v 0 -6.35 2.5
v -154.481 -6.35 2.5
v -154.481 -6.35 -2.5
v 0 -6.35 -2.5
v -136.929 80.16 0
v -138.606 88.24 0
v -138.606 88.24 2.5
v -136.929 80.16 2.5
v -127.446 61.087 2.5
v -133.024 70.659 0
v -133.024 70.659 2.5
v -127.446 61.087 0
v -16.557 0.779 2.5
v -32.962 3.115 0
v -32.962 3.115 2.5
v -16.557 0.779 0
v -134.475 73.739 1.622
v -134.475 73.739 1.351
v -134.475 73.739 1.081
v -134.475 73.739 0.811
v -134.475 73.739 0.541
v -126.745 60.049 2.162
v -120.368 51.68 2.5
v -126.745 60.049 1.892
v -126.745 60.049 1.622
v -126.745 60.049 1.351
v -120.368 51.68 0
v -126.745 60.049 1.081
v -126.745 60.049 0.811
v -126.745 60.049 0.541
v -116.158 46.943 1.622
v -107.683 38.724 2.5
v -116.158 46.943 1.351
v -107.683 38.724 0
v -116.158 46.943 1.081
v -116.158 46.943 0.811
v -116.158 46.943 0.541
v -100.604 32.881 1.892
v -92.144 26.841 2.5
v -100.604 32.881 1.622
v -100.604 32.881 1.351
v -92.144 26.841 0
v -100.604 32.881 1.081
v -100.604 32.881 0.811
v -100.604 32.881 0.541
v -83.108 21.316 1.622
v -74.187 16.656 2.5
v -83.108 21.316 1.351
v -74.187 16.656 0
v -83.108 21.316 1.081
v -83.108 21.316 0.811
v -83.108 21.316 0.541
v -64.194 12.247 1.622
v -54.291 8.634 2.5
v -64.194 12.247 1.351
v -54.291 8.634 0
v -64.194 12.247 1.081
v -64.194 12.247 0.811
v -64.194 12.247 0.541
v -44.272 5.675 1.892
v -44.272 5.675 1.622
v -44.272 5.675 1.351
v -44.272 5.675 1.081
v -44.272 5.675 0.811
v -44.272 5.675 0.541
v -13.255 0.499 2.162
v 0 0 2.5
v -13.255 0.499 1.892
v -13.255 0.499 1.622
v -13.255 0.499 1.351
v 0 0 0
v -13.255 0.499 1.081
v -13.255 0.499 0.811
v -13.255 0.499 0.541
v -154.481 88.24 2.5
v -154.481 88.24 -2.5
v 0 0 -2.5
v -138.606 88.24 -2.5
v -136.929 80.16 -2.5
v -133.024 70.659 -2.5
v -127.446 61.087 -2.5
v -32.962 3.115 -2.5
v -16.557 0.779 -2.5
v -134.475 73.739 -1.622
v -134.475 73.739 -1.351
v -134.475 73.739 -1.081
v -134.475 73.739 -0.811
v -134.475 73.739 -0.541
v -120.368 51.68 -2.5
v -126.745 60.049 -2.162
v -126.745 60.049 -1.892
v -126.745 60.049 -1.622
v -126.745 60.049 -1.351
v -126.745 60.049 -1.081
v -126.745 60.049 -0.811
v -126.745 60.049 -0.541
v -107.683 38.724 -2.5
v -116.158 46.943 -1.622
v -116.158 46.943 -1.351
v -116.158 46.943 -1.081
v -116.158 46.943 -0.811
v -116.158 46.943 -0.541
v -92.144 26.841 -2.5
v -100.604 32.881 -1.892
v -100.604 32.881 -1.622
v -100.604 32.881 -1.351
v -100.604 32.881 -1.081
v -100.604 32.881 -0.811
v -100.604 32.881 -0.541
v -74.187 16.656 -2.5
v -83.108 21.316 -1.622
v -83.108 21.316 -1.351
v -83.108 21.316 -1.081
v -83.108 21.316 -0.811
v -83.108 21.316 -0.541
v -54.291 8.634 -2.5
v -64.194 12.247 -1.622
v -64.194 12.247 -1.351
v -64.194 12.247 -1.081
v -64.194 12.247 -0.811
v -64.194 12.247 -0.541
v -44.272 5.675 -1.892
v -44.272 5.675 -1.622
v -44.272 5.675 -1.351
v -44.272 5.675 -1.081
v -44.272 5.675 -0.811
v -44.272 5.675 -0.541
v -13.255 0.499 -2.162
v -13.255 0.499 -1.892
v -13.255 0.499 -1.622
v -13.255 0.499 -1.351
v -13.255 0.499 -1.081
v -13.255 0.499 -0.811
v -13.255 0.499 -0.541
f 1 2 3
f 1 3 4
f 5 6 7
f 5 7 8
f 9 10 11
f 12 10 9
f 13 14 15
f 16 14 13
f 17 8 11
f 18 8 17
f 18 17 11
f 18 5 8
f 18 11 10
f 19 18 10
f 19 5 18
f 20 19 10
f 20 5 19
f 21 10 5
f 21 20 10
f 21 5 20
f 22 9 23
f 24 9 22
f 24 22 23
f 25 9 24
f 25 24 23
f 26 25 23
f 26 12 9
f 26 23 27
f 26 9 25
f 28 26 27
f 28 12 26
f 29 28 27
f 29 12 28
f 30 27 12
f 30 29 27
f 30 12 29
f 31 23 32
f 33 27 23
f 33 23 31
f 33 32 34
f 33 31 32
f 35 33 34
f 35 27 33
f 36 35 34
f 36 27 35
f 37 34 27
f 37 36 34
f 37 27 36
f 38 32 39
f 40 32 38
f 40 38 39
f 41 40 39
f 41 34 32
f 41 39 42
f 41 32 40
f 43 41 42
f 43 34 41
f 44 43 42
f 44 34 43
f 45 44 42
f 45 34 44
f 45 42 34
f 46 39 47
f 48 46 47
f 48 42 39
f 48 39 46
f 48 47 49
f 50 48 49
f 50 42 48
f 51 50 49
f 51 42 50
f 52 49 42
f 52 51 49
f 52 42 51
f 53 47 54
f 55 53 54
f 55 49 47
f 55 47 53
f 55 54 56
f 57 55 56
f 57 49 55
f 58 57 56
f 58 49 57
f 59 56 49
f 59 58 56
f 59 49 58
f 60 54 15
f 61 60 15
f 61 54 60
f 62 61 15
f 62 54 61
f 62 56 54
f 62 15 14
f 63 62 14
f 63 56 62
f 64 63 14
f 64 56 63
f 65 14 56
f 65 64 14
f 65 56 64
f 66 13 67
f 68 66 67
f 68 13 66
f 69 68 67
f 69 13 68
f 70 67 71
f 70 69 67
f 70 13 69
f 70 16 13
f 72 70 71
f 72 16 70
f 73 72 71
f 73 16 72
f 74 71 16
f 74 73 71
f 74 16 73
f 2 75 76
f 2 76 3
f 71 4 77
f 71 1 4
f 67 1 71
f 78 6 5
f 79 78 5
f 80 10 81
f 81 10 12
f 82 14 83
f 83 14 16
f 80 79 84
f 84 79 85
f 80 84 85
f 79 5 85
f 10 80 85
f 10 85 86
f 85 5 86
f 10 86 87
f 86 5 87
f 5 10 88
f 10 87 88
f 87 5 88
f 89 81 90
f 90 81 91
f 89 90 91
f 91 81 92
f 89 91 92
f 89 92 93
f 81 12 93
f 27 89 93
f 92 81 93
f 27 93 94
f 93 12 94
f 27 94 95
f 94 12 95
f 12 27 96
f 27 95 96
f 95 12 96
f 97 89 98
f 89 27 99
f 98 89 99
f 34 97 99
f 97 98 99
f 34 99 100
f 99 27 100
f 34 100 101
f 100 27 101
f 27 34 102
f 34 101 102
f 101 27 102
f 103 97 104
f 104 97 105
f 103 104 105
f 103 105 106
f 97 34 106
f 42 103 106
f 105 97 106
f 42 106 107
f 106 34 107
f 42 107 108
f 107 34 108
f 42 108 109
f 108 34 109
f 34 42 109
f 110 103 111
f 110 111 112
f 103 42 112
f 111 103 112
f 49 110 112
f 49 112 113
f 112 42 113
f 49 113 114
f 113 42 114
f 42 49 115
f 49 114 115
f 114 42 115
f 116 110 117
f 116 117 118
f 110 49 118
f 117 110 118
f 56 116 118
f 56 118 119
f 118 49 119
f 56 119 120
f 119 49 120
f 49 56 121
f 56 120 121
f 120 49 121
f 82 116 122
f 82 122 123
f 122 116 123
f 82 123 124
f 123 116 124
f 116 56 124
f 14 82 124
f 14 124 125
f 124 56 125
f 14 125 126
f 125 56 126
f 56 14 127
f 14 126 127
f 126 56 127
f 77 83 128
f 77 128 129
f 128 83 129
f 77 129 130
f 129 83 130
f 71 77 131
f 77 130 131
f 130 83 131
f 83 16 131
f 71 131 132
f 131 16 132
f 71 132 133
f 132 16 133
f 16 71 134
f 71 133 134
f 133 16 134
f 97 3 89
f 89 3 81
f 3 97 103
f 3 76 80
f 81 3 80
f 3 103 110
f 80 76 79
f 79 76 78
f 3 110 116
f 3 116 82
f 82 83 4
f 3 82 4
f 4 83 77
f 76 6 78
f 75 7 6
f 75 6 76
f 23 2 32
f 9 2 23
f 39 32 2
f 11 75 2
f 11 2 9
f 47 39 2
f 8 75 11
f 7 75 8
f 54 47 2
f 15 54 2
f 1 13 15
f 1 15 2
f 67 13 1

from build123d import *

# Parameters (mm, degrees)
BOSS_EXTRUDE1_DEPTH = 2.5


with BuildPart() as part:
    # Sketch1 → Boss-Extrude1 (new, symmetric)
    with BuildSketch(Plane.XY):
        with BuildLine():
            Line((-138.606439558, 88.2396), (-154.481439558, 88.2396))
            Line((-154.481439558, 88.2396), (-154.481439558, -6.35))
            Line((-154.481439558, -6.35), (0, -6.35))
            Line((0, -6.35), (0, 0))
            add(Edge.make_bspline(
                [(-138.606439558, 88.2396), (-138.606439558, 88.206480064), (-138.604893224, 88.134332137), (-138.597757085, 87.982040168), (-138.584504009, 87.767973581), (-138.563362589, 87.511833211), (-138.514302662, 87.023426652), (-138.425196169, 86.336581908), (-138.262733573, 85.340165391), (-137.997774346, 84.039042844), (-137.543893872, 82.163940465), (-136.709143666, 79.332808223), (-135.381511976, 75.692405853), (-133.427089014, 71.311625777), (-130.978665346, 66.686011286), (-128.248792738, 62.200876138), (-125.278396767, 57.871801388), (-121.922980854, 53.47598485), (-117.499907722, 48.25477976), (-111.846477366, 42.372548658), (-104.806706424, 36.032698765), (-96.481239759, 29.625824358), (-87.711829988, 23.843138375), (-78.562226684, 18.684637722), (-69.088219119, 14.150320925), (-59.340712588, 10.240190432), (-49.365347684, 6.954244107), (-41.111501611, 4.791563651), (-34.694119901, 3.420549472), (-30.177735786, 2.597379945), (-27.586849558, 2.166008761), (-24.349433278, 1.675559443), (-20.435573897, 1.165043535), (-15.888225625, 0.68322541), (-11.278370624, 0.337947753), (-7.392012303, 0.139524343), (-4.35262006, 0.048647043), (-2.477110072, 0.012428268), (-0.93320285, 0.001817838), (-0.315317676, 0), (0, 0)],
                knots=[0, 0, 0, 0, 0, 0.000750682, 0.001501364, 0.003002728, 0.004504092, 0.006005456, 0.011632897, 0.017260339, 0.025307868, 0.033355398, 0.051377592, 0.078047856, 0.105080676, 0.132113154, 0.15914583, 0.186178382, 0.213211084, 0.24601624, 0.3000815, 0.354146872, 0.408211991, 0.462277325, 0.516342503, 0.570407831, 0.624473028, 0.67853828, 0.732603517, 0.746119838, 0.759636158, 0.773152478, 0.786668798, 0.813701417, 0.840734035, 0.867766658, 0.88128297, 0.894799281, 0.901946134, 0.909092986, 0.909092986, 0.909092986, 0.909092986, 0.909092986], degree=4))
        make_face()
    extrude(amount=BOSS_EXTRUDE1_DEPTH, both=True)


solid = part.part
